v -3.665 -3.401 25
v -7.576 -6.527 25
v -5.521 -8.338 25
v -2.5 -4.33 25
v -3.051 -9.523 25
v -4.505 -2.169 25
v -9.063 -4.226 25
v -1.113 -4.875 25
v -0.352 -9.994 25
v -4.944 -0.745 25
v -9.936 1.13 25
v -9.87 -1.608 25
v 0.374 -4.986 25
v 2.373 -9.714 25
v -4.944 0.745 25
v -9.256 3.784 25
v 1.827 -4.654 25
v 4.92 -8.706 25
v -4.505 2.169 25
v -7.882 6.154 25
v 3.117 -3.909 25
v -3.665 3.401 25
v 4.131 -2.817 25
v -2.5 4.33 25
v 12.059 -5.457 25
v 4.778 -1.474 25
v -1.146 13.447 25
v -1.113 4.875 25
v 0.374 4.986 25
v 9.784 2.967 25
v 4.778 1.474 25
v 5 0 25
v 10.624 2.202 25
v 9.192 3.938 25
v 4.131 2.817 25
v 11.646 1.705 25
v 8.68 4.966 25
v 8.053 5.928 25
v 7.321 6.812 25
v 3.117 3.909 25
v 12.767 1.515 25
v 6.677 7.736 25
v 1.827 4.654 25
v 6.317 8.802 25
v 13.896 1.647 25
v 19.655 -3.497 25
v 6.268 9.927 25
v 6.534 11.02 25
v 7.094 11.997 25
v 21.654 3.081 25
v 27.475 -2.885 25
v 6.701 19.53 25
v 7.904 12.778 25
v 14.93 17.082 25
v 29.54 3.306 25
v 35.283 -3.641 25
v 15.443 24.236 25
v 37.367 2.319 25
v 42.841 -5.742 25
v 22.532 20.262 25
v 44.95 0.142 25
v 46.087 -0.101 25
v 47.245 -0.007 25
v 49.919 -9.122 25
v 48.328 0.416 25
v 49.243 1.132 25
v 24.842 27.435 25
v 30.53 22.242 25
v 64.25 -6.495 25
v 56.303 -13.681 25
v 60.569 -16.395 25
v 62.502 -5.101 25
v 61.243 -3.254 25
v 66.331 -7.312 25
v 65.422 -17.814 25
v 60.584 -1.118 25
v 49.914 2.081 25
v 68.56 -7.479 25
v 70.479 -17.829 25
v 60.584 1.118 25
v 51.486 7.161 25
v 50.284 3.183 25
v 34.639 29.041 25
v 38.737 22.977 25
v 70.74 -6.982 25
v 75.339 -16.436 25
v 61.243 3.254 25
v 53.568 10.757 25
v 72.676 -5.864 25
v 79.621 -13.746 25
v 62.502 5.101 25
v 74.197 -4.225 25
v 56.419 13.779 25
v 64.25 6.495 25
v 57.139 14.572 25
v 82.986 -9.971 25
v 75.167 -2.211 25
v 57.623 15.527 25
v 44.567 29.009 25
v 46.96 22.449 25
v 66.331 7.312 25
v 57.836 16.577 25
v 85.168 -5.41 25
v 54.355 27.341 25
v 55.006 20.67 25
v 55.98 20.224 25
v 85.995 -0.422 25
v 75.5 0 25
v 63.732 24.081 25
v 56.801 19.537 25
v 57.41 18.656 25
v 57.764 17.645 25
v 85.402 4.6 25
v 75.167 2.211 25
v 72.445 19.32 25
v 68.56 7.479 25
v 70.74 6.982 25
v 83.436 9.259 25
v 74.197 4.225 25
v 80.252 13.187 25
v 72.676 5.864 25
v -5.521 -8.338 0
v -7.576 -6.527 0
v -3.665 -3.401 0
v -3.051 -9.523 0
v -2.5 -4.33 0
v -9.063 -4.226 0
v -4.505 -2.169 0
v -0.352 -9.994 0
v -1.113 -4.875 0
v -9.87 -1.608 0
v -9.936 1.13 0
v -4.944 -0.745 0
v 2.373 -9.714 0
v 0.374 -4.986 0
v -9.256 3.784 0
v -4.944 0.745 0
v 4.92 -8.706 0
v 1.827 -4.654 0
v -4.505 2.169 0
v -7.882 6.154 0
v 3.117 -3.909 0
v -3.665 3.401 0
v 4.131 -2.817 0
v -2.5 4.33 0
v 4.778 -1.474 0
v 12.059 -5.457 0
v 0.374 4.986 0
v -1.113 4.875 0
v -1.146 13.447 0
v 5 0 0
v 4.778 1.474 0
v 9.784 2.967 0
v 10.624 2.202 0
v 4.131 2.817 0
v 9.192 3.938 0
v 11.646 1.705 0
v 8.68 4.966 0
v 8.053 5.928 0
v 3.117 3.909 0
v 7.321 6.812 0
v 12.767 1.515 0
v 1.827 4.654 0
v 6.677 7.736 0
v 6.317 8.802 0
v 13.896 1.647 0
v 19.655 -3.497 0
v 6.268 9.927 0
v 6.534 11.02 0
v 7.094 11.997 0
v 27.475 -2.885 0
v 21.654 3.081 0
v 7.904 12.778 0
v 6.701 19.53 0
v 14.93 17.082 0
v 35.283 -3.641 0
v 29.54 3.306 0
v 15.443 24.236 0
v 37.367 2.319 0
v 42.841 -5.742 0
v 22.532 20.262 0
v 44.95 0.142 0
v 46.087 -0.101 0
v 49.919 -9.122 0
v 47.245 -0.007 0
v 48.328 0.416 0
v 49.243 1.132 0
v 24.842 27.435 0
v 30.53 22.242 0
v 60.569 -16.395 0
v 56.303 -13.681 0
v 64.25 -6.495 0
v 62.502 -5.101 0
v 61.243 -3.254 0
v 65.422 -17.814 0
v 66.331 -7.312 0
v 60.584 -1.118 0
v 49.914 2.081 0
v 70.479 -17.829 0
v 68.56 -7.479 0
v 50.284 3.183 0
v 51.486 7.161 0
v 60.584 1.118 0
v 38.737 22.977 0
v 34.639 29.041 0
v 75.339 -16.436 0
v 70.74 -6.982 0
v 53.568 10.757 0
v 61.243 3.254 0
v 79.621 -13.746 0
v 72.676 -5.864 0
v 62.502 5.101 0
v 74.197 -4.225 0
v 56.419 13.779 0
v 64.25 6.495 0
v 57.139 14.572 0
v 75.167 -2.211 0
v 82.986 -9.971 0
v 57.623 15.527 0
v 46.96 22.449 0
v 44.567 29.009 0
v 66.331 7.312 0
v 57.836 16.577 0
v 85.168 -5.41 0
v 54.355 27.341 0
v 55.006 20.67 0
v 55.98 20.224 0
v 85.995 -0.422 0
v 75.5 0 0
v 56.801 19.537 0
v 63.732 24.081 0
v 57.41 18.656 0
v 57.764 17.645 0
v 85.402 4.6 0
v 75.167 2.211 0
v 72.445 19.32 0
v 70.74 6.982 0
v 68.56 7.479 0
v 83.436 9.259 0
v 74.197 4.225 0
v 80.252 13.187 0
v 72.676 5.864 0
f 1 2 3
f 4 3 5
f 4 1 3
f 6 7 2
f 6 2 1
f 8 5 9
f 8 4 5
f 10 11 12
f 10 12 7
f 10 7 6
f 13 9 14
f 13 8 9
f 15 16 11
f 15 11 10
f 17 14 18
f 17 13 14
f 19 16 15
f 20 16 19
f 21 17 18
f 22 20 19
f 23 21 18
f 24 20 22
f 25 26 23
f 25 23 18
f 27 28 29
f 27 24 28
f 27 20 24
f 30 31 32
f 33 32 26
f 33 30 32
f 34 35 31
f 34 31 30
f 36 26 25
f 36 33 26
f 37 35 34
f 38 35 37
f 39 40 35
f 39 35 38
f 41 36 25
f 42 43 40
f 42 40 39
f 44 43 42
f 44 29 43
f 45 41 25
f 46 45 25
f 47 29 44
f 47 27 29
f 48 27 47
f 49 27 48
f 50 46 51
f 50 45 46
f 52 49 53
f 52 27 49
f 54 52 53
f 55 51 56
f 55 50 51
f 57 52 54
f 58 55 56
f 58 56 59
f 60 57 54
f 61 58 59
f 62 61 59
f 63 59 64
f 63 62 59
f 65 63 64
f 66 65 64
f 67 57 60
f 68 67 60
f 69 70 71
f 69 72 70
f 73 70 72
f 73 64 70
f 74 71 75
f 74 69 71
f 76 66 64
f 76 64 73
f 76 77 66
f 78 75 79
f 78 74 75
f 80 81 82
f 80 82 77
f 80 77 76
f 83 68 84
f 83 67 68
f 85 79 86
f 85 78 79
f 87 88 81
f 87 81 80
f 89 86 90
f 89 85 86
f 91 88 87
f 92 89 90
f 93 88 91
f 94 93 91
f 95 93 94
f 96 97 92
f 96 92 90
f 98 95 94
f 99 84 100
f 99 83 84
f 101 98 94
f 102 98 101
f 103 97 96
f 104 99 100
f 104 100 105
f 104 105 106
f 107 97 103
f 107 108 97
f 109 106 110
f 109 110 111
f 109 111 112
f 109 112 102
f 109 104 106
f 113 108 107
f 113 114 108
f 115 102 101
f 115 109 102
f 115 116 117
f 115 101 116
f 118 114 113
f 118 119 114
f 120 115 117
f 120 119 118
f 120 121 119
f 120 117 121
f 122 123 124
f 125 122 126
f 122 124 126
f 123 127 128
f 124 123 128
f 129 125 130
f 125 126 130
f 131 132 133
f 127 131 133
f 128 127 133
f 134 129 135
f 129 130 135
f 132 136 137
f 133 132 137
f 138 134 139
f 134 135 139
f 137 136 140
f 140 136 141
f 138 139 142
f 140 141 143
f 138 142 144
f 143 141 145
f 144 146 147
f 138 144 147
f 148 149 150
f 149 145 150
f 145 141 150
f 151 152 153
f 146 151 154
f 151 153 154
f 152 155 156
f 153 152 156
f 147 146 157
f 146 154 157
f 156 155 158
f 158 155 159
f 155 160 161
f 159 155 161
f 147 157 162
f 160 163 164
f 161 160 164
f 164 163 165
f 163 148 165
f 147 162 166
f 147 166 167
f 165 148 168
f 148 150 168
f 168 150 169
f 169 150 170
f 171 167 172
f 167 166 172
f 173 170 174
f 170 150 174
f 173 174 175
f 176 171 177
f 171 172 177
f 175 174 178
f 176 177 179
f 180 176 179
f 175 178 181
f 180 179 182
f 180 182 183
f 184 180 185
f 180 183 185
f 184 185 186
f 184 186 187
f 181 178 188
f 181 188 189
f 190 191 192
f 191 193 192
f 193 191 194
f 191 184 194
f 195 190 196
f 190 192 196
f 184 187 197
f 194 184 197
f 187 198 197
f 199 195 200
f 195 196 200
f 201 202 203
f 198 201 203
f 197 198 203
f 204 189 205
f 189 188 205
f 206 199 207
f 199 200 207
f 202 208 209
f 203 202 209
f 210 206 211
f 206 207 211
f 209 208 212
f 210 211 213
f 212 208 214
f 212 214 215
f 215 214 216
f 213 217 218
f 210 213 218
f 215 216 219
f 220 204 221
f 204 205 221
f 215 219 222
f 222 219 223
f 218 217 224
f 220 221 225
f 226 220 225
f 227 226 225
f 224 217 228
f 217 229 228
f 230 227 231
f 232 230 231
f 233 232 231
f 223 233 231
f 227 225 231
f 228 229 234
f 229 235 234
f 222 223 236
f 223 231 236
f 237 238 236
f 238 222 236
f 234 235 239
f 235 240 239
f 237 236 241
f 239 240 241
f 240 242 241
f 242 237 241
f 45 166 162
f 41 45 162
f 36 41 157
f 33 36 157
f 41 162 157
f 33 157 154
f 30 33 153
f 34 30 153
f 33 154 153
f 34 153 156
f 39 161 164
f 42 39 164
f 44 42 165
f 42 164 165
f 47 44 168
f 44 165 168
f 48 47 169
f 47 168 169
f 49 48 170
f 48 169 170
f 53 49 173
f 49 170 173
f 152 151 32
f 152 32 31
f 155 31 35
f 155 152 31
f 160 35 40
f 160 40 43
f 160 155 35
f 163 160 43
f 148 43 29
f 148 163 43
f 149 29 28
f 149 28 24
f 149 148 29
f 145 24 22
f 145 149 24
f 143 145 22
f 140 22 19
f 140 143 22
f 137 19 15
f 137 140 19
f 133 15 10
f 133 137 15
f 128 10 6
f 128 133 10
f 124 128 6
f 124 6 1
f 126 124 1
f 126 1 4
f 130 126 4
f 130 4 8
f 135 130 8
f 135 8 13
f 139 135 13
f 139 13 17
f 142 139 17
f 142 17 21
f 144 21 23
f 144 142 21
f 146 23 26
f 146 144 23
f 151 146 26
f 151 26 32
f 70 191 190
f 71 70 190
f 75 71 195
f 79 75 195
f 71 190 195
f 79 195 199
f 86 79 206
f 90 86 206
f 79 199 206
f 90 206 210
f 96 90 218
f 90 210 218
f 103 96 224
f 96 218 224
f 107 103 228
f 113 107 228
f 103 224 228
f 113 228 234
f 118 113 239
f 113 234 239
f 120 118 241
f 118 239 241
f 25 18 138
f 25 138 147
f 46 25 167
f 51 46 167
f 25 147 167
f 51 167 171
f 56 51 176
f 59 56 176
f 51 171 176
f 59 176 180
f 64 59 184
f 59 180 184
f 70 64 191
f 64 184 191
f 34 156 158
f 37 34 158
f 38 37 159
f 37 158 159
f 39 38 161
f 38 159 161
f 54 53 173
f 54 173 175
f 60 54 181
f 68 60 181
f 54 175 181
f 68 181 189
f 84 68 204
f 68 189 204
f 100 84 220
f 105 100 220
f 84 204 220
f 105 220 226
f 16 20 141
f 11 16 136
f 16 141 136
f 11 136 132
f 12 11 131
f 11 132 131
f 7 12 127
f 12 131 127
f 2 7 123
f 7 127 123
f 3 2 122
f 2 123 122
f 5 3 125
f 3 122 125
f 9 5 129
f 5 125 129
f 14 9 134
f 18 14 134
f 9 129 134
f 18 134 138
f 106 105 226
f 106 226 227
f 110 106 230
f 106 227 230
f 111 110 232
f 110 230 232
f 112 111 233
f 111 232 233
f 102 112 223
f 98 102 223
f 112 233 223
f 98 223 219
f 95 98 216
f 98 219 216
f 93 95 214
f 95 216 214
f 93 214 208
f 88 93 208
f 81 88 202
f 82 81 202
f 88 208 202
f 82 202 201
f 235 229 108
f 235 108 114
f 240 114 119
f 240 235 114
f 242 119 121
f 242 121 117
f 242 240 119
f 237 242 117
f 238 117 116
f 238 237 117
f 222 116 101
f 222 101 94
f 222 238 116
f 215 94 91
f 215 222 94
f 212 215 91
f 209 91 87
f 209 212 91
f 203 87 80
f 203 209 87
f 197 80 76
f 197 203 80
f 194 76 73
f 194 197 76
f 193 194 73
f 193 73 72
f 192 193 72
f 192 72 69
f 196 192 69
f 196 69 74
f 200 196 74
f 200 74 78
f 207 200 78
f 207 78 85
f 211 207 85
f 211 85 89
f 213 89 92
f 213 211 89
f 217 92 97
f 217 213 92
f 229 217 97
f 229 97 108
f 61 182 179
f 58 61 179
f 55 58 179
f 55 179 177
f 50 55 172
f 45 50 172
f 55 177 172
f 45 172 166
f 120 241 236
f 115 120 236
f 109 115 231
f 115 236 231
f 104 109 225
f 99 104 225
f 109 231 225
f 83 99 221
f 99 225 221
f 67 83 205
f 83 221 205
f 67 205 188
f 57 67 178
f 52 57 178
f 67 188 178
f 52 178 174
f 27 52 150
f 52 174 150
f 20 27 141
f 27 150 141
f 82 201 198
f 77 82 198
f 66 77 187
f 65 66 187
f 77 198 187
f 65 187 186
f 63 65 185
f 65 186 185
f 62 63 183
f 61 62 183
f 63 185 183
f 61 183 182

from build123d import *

# Parameters (mm, degrees)
F0_R     = 5
F0_R_2   = 7.5
F1_DEPTH = 25


with BuildPart() as f1:
    # F0 (on Top) → F1 (new body)
    with BuildSketch(Plane.XY):
        with BuildLine():
            ThreePointArc((56.302521, -13.680972), (81.43664, -11.977341), (80.252101, 13.186585))
            ThreePointArc((80.252101, 13.186585), (34.639129, 29.041183), (-7.882353, 6.15374))
            ThreePointArc((-7.882353, 6.15374), (-7.576127, -6.527043), (4.919786, -8.706073))
            ThreePointArc((4.919786, -8.706073), (31.395464, -3.092849), (56.302521, -13.680972))
        make_face()
        Circle(F0_R, mode=Mode.SUBTRACT)
        with Locations((68, 0)):
            Circle(F0_R_2, mode=Mode.SUBTRACT)
        with BuildLine():
            ThreePointArc((44.950326, 0.142182), (29.540091, 3.306499), (13.896058, 1.647439))
            ThreePointArc((13.896058, 1.647439), (11.117549, 1.916957), (9.191943, 3.938043))
            ThreePointArc((9.191943, 3.938043), (8.380408, 5.456075), (7.320562, 6.812443))
            ThreePointArc((7.320562, 6.812443), (6.267781, 9.926776), (7.904024, 12.778113))
            ThreePointArc((7.904024, 12.778113), (30.530218, 22.242438), (55.005596, 20.669565))
            ThreePointArc((55.005596, 20.669565), (57.763559, 17.645265), (56.418739, 13.779492))
            ThreePointArc((56.418739, 13.779492), (52.422533, 9.019009), (50.283693, 3.183153))
            ThreePointArc((50.283693, 3.183153), (48.328016, 0.415678), (44.950326, 0.142182))
        make_face(mode=Mode.SUBTRACT)
    extrude(amount=F1_DEPTH)


solid = f1.part
